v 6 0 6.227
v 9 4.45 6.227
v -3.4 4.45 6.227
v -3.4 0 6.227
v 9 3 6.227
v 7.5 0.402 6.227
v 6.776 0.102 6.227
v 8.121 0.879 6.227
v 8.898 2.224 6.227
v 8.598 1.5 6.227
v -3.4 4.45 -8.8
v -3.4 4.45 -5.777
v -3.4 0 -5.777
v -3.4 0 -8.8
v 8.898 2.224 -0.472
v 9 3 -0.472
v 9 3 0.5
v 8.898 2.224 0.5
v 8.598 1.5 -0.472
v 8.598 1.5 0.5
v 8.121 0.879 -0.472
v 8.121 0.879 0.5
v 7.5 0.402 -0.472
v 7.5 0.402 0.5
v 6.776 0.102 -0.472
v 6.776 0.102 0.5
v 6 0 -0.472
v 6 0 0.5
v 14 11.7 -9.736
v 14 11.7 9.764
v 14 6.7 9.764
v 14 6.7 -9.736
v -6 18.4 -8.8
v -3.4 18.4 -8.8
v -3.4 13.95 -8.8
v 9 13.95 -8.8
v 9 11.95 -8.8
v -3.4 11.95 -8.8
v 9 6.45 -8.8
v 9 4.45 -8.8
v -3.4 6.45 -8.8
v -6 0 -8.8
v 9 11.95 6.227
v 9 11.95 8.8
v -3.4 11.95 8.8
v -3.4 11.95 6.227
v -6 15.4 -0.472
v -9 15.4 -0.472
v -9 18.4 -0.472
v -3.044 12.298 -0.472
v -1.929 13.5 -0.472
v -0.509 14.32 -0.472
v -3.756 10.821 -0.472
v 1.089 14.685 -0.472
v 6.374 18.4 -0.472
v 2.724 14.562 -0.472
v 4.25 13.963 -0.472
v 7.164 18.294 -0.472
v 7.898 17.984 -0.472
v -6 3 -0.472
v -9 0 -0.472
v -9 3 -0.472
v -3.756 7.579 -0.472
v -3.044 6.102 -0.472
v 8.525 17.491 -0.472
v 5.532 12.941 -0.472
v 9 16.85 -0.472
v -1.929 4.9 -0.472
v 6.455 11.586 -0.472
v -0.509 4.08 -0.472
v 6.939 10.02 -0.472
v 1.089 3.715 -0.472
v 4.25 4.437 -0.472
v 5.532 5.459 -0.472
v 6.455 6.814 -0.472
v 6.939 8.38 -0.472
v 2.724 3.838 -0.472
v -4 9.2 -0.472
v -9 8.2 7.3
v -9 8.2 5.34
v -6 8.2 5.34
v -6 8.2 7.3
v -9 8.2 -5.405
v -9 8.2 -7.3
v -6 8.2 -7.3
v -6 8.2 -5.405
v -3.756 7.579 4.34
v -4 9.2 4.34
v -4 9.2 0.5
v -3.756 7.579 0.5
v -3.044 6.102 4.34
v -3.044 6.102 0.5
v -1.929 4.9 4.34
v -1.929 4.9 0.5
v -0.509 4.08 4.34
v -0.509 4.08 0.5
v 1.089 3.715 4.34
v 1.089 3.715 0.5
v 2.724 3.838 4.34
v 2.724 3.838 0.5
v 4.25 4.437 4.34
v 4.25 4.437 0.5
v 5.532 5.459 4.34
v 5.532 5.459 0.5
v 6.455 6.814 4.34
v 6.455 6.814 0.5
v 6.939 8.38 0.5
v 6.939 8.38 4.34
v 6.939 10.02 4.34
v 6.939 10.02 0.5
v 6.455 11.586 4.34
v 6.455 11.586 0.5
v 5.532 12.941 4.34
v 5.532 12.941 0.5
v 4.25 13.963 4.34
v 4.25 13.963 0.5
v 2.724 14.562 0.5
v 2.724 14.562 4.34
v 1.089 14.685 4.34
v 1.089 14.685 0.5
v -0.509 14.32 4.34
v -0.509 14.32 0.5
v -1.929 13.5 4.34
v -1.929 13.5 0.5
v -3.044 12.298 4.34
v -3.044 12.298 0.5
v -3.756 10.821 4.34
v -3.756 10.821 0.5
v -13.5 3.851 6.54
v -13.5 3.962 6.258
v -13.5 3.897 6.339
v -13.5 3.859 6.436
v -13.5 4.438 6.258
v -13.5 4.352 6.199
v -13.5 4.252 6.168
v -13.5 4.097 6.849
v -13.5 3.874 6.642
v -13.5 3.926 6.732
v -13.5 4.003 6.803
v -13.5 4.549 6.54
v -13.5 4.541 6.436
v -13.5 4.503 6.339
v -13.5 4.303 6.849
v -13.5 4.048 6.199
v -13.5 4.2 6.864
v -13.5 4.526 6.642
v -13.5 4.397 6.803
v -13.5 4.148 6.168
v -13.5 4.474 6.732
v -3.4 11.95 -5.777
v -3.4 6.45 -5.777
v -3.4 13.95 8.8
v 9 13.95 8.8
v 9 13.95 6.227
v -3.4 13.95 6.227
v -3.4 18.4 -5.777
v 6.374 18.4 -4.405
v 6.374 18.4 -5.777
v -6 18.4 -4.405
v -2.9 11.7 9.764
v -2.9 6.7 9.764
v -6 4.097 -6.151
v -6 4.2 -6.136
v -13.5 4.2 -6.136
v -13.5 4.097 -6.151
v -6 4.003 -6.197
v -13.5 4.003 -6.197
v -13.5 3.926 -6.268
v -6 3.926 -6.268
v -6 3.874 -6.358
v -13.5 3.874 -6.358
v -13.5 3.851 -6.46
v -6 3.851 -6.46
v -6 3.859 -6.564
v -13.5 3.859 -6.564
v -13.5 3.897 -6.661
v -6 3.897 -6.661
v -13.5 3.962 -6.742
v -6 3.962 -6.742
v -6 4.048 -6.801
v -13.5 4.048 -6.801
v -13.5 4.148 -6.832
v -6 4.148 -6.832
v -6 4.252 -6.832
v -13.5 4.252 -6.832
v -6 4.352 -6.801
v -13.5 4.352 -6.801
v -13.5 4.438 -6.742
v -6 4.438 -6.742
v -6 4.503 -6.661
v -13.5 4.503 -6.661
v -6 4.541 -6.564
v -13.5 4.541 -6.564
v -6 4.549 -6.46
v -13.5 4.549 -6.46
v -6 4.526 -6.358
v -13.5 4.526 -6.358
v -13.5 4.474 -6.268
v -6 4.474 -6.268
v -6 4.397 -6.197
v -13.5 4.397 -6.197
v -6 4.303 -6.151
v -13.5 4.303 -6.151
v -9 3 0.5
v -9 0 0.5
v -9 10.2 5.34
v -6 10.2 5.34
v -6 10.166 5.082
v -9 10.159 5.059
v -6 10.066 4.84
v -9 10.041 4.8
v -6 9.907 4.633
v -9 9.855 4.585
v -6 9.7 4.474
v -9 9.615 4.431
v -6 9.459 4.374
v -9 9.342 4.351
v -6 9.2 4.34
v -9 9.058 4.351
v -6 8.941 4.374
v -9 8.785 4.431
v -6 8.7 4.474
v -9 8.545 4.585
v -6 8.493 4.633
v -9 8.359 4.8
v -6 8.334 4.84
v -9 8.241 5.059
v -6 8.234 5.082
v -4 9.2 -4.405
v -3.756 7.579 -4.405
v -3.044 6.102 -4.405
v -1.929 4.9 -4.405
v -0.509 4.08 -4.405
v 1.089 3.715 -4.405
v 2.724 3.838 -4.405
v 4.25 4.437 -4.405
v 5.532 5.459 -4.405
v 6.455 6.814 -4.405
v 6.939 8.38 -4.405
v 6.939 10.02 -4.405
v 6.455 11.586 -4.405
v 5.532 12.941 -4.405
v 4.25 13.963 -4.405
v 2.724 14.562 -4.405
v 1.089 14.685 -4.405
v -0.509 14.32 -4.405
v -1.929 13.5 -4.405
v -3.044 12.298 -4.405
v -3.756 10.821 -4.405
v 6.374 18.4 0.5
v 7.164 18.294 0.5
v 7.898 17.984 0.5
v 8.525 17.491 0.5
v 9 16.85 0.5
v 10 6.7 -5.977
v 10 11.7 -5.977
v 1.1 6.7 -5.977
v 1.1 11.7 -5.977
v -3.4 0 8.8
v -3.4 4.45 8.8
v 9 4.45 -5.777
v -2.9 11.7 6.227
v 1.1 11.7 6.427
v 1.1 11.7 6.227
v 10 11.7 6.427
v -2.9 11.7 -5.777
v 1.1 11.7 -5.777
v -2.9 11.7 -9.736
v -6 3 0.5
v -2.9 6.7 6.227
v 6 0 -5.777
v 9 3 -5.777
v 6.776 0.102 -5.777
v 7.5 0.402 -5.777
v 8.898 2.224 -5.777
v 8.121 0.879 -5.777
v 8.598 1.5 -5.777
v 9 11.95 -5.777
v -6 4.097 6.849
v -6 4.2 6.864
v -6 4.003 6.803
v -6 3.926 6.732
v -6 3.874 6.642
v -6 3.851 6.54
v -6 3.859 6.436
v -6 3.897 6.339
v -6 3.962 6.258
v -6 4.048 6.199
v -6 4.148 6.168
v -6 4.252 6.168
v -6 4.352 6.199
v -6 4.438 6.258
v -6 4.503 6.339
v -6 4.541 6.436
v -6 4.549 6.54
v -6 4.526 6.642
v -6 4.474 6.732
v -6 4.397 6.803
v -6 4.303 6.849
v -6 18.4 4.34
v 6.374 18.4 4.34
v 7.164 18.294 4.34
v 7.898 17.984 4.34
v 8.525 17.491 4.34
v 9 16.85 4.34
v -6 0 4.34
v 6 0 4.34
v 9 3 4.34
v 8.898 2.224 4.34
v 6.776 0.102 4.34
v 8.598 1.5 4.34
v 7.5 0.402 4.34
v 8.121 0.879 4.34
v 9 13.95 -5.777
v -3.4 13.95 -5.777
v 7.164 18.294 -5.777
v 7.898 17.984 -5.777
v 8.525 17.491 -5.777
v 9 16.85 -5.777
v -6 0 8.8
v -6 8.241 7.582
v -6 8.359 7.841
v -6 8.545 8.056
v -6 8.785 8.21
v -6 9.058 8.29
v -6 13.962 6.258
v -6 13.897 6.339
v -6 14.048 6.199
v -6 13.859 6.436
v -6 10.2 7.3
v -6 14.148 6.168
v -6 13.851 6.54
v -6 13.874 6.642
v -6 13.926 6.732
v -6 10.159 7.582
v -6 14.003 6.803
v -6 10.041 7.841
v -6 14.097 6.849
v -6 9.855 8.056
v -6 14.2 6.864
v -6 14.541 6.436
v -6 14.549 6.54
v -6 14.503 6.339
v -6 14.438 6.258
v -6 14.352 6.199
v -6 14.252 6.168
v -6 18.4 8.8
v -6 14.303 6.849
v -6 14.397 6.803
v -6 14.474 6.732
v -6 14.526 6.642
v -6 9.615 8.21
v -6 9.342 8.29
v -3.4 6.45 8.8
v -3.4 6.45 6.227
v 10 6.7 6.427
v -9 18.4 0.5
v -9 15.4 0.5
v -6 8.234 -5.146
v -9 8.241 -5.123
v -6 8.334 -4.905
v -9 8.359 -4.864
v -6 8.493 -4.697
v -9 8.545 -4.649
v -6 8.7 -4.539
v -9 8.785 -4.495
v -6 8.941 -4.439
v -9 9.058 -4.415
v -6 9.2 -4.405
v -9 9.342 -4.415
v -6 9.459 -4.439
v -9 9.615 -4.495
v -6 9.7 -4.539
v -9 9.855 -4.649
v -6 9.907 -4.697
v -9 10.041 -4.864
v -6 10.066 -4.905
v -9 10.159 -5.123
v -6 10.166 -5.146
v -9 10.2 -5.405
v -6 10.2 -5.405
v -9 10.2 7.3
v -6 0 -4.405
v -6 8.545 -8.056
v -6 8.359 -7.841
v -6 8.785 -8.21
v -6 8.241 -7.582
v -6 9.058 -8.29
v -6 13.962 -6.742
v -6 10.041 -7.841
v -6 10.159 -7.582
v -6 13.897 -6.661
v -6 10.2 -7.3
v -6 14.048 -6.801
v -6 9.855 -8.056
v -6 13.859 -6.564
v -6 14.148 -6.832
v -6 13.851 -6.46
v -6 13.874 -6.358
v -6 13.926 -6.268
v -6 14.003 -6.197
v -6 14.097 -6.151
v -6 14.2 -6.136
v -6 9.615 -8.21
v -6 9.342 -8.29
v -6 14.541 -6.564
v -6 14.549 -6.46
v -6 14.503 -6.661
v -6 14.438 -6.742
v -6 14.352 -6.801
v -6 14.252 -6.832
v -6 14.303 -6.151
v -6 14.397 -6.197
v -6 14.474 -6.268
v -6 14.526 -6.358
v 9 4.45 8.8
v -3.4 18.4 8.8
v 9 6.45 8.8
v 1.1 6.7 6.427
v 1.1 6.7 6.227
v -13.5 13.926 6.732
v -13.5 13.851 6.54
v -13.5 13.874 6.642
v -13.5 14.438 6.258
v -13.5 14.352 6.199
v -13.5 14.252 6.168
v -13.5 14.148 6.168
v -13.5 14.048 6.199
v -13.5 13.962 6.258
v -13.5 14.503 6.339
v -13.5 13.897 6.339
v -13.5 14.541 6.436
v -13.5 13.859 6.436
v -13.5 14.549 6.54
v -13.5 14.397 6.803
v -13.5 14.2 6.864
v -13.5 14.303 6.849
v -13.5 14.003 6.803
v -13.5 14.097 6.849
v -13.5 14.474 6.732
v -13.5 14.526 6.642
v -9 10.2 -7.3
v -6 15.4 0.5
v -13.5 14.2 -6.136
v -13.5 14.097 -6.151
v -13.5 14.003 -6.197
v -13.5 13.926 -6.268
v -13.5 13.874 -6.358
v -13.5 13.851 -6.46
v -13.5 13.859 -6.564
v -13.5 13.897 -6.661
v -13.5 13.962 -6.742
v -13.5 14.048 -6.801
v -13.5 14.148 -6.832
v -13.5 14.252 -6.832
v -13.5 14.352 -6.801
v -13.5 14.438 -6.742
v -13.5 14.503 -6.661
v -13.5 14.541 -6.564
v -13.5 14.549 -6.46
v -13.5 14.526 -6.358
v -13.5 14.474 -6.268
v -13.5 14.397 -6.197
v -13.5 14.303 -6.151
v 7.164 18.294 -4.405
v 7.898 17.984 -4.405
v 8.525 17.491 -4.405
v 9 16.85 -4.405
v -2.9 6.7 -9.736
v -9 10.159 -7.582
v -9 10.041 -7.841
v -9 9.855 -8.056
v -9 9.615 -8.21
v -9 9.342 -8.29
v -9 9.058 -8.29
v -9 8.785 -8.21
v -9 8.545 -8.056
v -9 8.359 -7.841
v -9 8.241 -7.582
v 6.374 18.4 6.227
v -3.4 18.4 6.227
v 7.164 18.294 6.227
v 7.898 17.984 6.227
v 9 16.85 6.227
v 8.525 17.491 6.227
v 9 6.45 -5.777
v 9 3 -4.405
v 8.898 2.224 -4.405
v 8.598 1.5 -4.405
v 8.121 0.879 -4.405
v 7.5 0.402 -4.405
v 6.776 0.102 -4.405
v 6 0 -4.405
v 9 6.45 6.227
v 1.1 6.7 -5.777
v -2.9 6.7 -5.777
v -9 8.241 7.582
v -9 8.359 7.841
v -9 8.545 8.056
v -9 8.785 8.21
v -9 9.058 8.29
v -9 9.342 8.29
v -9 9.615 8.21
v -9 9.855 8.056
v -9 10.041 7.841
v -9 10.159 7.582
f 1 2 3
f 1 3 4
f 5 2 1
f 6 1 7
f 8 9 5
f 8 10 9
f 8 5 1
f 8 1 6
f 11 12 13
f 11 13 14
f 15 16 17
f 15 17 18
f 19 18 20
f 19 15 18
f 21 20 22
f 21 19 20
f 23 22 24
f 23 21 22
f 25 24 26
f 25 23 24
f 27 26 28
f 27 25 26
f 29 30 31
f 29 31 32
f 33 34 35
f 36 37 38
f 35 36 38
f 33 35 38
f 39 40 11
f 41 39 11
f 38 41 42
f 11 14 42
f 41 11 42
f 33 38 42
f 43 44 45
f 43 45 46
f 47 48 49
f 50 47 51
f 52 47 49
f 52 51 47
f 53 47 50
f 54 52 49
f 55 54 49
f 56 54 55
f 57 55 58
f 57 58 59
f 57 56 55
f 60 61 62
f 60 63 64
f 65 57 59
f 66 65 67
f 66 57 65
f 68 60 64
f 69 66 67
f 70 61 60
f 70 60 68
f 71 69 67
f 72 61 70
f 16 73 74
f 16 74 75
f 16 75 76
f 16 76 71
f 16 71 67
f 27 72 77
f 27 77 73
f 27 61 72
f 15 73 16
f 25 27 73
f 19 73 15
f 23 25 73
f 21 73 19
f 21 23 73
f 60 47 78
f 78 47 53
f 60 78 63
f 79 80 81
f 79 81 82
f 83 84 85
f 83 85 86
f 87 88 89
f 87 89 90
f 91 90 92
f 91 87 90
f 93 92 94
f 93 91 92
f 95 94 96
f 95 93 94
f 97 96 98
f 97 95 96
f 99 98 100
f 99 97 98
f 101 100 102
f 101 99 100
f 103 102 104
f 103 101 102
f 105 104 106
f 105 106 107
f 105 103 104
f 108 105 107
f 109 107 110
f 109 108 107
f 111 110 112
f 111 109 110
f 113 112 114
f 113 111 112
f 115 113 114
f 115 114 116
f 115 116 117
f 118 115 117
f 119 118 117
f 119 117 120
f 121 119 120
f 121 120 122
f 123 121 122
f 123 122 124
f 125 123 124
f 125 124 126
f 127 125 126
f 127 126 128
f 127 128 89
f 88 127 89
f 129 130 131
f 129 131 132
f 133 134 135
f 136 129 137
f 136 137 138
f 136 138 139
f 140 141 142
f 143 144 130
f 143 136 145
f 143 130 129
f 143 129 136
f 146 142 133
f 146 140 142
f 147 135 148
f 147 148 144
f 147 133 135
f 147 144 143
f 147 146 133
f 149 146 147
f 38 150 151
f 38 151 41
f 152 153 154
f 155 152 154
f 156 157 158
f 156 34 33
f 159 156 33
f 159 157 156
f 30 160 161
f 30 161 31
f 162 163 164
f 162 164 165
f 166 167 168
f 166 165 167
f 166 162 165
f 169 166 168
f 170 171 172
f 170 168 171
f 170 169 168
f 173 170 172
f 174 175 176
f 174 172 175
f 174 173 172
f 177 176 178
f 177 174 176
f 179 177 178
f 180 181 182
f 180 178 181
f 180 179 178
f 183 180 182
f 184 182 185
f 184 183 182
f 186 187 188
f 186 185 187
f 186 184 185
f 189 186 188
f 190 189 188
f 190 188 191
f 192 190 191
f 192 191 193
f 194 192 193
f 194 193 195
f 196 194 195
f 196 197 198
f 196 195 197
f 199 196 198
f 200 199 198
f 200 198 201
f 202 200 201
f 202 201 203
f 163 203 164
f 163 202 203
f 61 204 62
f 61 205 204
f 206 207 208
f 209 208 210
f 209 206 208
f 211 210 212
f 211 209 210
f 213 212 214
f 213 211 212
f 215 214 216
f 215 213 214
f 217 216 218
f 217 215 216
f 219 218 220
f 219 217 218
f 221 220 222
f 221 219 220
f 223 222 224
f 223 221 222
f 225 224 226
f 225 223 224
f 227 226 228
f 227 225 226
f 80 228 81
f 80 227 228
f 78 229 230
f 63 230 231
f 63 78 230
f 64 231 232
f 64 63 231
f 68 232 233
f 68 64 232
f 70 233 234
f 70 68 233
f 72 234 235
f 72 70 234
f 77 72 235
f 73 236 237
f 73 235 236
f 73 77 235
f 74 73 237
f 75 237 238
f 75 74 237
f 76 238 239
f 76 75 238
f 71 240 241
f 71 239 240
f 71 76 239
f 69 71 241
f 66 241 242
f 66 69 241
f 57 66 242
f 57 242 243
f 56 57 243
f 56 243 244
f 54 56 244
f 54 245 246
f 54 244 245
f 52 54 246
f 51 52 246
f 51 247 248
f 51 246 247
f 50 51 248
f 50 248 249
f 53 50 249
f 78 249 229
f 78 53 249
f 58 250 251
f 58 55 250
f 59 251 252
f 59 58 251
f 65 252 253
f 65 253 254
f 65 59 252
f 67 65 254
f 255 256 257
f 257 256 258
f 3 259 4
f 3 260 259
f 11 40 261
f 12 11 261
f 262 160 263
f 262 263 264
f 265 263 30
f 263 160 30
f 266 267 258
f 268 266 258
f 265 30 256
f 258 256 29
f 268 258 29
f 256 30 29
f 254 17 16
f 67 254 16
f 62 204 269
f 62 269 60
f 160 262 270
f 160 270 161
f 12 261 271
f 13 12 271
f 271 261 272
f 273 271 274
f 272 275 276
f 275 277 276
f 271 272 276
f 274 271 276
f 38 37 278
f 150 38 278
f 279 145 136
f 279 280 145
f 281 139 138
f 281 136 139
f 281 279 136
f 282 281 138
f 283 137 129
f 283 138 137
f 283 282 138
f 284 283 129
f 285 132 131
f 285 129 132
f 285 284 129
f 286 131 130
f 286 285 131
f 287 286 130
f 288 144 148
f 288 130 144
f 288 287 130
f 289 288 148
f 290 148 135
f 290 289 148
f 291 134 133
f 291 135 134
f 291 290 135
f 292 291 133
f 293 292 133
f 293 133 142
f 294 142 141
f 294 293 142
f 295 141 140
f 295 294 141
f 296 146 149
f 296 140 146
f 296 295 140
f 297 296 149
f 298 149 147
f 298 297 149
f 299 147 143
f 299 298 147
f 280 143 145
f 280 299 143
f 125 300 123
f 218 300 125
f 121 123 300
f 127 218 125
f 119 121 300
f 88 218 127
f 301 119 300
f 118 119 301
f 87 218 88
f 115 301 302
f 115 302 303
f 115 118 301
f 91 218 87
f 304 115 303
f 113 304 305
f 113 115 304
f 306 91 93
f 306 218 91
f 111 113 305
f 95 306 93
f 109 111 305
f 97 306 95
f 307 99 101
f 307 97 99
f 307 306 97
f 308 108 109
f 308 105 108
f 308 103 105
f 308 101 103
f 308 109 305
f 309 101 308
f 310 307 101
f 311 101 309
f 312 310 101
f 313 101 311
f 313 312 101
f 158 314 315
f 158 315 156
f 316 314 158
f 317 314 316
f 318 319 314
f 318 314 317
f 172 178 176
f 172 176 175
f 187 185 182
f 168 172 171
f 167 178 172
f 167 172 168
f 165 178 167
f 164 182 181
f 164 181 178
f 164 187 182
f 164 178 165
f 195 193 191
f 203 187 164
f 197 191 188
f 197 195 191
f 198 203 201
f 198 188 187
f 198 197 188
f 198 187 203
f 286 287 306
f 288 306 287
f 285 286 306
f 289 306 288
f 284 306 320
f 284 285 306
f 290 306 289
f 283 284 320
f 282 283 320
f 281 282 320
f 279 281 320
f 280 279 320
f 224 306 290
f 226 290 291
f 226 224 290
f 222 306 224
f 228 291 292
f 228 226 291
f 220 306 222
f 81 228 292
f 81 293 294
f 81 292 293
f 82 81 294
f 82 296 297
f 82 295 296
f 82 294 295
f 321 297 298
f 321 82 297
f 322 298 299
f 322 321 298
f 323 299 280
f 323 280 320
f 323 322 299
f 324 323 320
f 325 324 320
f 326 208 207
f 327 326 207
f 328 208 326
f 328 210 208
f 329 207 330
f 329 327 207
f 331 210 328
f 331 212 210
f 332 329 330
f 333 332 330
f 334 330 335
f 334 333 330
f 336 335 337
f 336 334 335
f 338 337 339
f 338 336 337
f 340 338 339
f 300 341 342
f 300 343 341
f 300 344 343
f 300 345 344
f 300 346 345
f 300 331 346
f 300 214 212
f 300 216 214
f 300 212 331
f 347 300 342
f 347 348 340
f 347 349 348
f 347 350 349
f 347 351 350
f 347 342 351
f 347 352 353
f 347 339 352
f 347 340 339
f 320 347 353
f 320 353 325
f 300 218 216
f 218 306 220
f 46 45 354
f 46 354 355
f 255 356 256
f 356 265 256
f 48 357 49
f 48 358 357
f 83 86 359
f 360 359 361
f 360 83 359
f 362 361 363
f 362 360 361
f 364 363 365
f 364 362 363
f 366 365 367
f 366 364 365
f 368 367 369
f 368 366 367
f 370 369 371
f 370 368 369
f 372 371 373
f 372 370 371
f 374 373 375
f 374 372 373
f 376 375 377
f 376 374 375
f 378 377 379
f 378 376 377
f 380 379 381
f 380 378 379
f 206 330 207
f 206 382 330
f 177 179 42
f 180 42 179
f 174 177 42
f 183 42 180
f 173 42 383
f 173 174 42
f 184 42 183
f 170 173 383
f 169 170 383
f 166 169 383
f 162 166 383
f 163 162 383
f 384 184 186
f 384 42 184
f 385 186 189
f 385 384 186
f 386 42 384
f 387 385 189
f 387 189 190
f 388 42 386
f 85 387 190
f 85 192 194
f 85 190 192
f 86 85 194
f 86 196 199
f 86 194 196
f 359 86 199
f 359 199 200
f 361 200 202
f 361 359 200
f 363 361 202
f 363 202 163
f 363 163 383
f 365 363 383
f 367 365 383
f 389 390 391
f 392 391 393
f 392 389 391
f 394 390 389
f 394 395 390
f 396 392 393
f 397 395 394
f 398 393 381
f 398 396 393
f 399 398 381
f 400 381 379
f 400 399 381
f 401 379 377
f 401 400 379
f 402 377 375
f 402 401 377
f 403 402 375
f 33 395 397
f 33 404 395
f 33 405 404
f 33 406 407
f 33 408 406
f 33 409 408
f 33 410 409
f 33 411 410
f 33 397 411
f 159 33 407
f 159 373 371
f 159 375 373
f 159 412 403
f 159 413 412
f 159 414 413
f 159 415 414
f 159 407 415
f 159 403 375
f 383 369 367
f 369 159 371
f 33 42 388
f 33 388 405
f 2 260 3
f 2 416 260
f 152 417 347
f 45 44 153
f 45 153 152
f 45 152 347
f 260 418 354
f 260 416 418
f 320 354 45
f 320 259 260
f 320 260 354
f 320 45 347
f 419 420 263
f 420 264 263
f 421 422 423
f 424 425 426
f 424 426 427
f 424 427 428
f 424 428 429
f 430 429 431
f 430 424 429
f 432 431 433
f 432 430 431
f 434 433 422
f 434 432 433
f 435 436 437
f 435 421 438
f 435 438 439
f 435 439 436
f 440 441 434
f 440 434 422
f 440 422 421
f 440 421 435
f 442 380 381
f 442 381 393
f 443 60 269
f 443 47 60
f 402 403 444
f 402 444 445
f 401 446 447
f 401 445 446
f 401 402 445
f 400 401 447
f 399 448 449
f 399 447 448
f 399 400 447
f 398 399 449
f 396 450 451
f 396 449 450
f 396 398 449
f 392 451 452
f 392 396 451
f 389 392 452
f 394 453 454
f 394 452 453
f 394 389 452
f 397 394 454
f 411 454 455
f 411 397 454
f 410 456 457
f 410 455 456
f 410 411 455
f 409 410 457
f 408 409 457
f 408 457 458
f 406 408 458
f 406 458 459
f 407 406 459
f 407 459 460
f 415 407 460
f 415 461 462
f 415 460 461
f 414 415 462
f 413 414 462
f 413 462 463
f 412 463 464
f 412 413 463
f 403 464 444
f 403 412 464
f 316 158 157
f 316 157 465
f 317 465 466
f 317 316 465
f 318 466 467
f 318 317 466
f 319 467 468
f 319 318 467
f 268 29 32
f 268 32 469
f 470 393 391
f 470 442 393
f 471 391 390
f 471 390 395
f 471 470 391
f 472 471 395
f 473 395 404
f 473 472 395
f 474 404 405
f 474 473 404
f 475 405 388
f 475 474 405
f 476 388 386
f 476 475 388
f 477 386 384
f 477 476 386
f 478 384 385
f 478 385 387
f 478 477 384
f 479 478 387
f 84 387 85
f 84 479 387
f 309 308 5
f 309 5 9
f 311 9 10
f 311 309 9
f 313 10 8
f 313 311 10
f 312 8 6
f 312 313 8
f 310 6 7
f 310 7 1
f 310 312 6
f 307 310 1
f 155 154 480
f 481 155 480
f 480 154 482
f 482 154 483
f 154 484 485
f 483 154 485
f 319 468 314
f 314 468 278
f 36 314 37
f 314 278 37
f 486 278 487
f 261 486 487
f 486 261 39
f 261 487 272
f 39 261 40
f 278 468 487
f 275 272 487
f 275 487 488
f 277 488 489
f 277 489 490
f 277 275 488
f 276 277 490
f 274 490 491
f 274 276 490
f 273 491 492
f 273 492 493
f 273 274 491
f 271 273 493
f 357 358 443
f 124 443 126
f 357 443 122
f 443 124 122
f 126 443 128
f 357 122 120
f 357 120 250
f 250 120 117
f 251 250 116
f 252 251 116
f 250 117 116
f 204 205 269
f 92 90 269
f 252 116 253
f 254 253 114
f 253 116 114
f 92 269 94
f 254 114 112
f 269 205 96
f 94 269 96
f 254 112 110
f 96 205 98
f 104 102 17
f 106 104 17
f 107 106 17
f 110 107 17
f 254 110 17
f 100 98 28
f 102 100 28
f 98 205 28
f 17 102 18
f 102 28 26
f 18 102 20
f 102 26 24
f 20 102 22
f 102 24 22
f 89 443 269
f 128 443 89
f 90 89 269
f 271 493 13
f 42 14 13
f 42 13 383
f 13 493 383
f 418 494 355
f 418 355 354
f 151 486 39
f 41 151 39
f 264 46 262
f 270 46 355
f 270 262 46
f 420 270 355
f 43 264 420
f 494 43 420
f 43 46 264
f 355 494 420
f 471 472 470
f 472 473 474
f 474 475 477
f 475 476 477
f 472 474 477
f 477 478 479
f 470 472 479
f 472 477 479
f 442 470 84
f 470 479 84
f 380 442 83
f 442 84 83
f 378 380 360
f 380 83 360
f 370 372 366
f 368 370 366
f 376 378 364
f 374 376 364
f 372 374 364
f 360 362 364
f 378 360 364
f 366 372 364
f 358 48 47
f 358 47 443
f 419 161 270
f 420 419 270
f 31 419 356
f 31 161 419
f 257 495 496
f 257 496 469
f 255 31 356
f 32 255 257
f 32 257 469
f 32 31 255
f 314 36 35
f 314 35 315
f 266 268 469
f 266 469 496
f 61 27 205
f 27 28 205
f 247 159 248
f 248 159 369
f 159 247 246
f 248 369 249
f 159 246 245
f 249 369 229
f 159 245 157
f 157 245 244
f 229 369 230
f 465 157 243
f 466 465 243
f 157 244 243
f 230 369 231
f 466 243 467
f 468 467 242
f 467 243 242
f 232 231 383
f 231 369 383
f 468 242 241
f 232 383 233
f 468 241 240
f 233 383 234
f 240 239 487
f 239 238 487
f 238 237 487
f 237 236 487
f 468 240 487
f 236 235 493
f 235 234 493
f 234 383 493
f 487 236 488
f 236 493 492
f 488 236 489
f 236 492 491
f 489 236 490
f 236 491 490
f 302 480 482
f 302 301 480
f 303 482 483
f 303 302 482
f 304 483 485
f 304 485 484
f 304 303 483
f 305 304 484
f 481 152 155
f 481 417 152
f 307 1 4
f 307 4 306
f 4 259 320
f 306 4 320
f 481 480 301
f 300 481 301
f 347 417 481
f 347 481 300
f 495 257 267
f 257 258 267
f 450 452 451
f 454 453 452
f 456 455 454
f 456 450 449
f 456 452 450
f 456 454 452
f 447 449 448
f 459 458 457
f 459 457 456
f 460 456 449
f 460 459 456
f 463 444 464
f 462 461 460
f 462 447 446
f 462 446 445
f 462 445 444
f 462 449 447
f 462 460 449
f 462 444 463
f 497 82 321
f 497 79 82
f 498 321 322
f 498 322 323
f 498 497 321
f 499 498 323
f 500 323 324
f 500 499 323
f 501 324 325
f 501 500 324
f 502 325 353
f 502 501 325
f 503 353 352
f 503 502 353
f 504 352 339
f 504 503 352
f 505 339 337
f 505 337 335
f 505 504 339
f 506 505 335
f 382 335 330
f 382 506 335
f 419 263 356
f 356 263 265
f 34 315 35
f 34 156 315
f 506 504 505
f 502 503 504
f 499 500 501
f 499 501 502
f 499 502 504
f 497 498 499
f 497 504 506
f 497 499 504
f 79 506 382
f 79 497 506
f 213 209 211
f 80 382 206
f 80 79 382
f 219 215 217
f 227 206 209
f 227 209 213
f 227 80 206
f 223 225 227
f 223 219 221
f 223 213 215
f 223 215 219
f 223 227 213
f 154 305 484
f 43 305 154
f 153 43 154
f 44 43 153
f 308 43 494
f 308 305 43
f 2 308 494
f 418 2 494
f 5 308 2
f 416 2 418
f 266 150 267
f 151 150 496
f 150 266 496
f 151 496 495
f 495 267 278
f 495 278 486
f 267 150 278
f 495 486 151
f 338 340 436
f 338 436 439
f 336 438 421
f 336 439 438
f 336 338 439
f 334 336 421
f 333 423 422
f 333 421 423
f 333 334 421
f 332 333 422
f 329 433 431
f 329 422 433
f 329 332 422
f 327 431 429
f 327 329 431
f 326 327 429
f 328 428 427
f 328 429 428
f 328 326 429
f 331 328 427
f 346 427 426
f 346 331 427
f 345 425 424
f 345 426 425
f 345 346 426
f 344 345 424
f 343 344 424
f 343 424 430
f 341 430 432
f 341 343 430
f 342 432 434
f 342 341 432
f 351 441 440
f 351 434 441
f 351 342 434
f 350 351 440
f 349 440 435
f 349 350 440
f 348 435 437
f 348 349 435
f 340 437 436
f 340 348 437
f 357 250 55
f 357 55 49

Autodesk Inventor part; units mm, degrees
ref_plane "YZ Plane" through (0, 0, 0) normal (1, 0, 0) x (0, 1, 0)
ref_plane "XZ Plane" through (0, 0, 0) normal (0, 1, 0) x (-1, 0, 0)
ref_plane "XY Plane" through (0, 0, 0) normal (0, 0, 1) x (1, 0, 0)
sketch "Эскиз1" plane through (0, 0, 0) normal (0, 1, 0) x (-1, 0, 0)
  line L0 (9, 8.8) -> (9, -8.8) construction
  line L1 (-9, -8.8) -> (-9, 8.8) construction
  line L2 (-9, 8.8) -> (9, -8.8) construction
  line L3 (9, 8.8) -> (-9, -8.8) construction
  line L4 (9, 0) -> (9, 0.5)
  line L5 (9, 0.5) -> (-9, 0.5)
  line L6 (9, 0) -> (9, -0.4719)
  line L7 (9, -0.4719) -> (-9, -0.4719)
  line L8 (-9, 0.5) -> (-9, -0.4719)
  line L9 (9, 0) -> (9, 4.3404) construction
  line L10 (9, 0) -> (9, -4.4046) construction
  line L11 (9, 4.3404) -> (-9, 4.3404)
  line L12 (-9, 4.3404) -> (-9, 8.8)
  line L13 (-9, 8.8) -> (9, 8.8)
  line L14 (9, 8.8) -> (9, 4.3404)
  line L15 (9, -4.4046) -> (-9, -4.4046)
  line L16 (-9, -4.4046) -> (-9, -8.8)
  line L17 (-9, -8.8) -> (9, -8.8)
  line L18 (9, -8.8) -> (9, -4.4046)
  point P0 (0, 0)
  dimension "d0" = 18
  dimension "d1" = 17.6
  dimension "d2" = 0.5
extrude "Выдавливание1" add sketch "Эскиз1" along normal blind 18.4
sketch "Эскиз4" plane through (9, 0, 8.8) normal (1, 0, 0) x (0, 0, -1)
  line L0 (13.2046, 0) -> (17.6, 0) projected
  line L1 (14.5773, 0) -> (21.0298, 0)
  line L2 (21.0298, 0) -> (21.0298, 4.45)
  line L3 (21.0298, 4.45) -> (14.5773, 4.45)
  line L4 (14.5773, 4.45) -> (14.5773, 0)
  line L5 (14.5773, 18.4) -> (21.6, 18.4)
  line L6 (21.6, 18.4) -> (21.6, 13.95)
  line L7 (21.6, 13.95) -> (14.5773, 13.95)
  line L8 (14.5773, 13.95) -> (14.5773, 18.4)
  line L9 (4.4596, 18.4) -> (0, 18.4) projected
  line L10 (2.5726, 18.4) -> (-5.1704, 18.4)
  line L11 (-5.1704, 18.4) -> (-5.1704, 13.95)
  line L12 (-5.1704, 13.95) -> (2.5726, 13.95)
  line L13 (2.5726, 13.95) -> (2.5726, 18.4)
  line L14 (4.4596, 0) -> (0, 0) projected
  line L15 (2.5726, 0) -> (-6.491, 0)
  line L16 (-6.491, 0) -> (-6.491, 4.45)
  line L17 (-6.491, 4.45) -> (2.5726, 4.45)
  line L18 (2.5726, 4.45) -> (2.5726, 0)
  line L19 (20.6227, 11.95) -> (14.5773, 11.95)
  line L20 (14.5773, 11.95) -> (14.5773, 6.45)
  line L21 (14.5773, 6.45) -> (20.6227, 6.45)
  line L22 (20.6227, 6.45) -> (20.6227, 11.95)
  line L23 (17.6, 0) -> (17.6, 18.4) projected
  line L24 (20.6227, 11.95) -> (14.5773, 6.45) construction
  line L25 (14.5773, 11.95) -> (20.6227, 6.45) construction
  line L26 (-2.5726, 11.95) -> (2.5726, 11.95)
  line L27 (2.5726, 11.95) -> (2.5726, 6.45)
  line L28 (2.5726, 6.45) -> (-2.5726, 6.45)
  line L29 (-2.5726, 6.45) -> (-2.5726, 11.95)
  line L30 (0, 0) -> (0, 18.4) projected
  line L31 (-2.5726, 11.95) -> (2.5726, 6.45) construction
  line L32 (2.5726, 11.95) -> (-2.5726, 6.45) construction
  point P0 (8.8, 0)
  point P1 (17.6, 9.2)
  point P2 (0, 9.2)
  dimension "d12" = 5.5
  dimension "d41" = 2
  dimension "d42" = 2
  dimension "d43" = 2
extrude "Выдавливание2" cut sketch "Эскиз4" against normal blind 12.4
sketch "Эскиз6" plane through (9, 0, 4.3404) normal (0, 0, -1) x (-1, 0, 0)
  line L0 (9, 0) -> (9, 18.4) construction
  line L1 (18, 18.4) -> (0, 18.4) projected
  line L2 (9, 9.2) -> (7.5, 9.2) construction
  circle A0 centre (7.5, 9.2) radius 5.5
  dimension "d16" = 1.5
  dimension "d53" = 11
sketch "Эскиз7" plane through (-9, 0, -8.8) normal (0, 0, -1) x (-1, 0, 0)
  line L0 (-18, 13.95) -> (-5.6, 13.95) projected
  line L1 (-18, 0) -> (-18, 18.4) construction
  line L2 (-21, -3) -> (-15, -3) construction
  line L3 (-15, -3) -> (-15, 3) construction
  line L4 (-15, 3) -> (-21, 3) construction
  line L5 (-21, 3) -> (-21, -3) construction
  line L6 (-21, -3) -> (-15, 3) construction
  line L7 (-15, -3) -> (-21, 3) construction
  line L8 (-21.3737, 21.4) -> (-15.3737, 21.4) construction
  line L9 (-15.3737, 21.4) -> (-15.3737, 15.4) construction
  line L10 (-15.3737, 15.4) -> (-21.3737, 15.4) construction
  line L11 (-21.3737, 15.4) -> (-21.3737, 21.4) construction
  line L12 (-21.3737, 21.4) -> (-15.3737, 15.4) construction
  line L13 (-15.3737, 21.4) -> (-21.3737, 15.4) construction
  arc A0 (-18, 3) -> (-15, 0) centre (-15, 3) ccw
  arc A1 (-15.3737, 18.4) -> (-18, 13.95) centre (-15.3737, 15.4) ccw
  line L14 (-18, 3) -> (-18, 0)
  line L15 (-15, 0) -> (-18, 0)
  line L16 (-15.3737, 18.4) -> (-18, 18.4)
  line L17 (-18, 13.95) -> (-18, 18.4)
  point P0 (-9, 0)
  dimension "d21" = 6
  dimension "d22" = 6
extrude "Выдавливание3" add sketch "Эскиз6" along normal up to surface (8.745 mm away)
extrude "Выдавливание4" cut sketch "Эскиз7" against normal blind 23
ref_plane "РабПлоскость1" through (-3.4, 9.2, 8.8) normal (0, -1, 0) x (0, 0, -1)
sketch "Эскиз9" plane through (-3.4, 9.2, 8.8) normal (0, -1, 0) x (0, 0, -1)
  line L0 (-0.964, 17.4) -> (18.536, 17.4)
  line L1 (18.536, 17.4) -> (18.536, 0.5)
  line L2 (18.536, 0.5) -> (-0.964, 0.5)
  line L3 (-0.964, 0.5) -> (-0.964, 17.4)
  line L4 (2.3726, 13.4) -> (14.7773, 13.4)
  line L5 (14.7773, 13.4) -> (14.7773, 4.5)
  line L6 (14.7773, 4.5) -> (2.3726, 4.5)
  line L7 (2.3726, 4.5) -> (2.3726, 13.4)
  line L8 (8.786, 13.2041) -> (8.786, 18.9436) construction
  line L9 (0, 0) -> (0, 12.4) projected
  line L10 (17.6, -5.6) -> (13.2046, -5.6) projected
  point P0 (8.8, 3.4)
  point P1 (17.6, 0)
  point P2 (2.5726, 12.4)
  point P3 (14.5773, 12.4)
  dimension "d30" = 8.786
  dimension "d31" = 9.75
  dimension "d32" = 9.75
  dimension "d33" = 23
  dimension "d34" = 0.5
  dimension "d35" = 0.2
  dimension "d36" = 0.2
  dimension "d37" = 4
  dimension "d38" = 4
extrude "Выдавливание5" add sketch "Эскиз9" along normal mid plane 5
sketch "Эскиз10" plane through (-9, 0, 4.3404) normal (-1, 0, 0) x (0, 0, 1)
  line L0 (4.4596, 6.45) -> (4.4596, 11.95) projected
  line L1 (4.4596, 9.2) -> (-13.9375, 9.2) construction
  line L2 (-14.0763, 6.7) -> (-14.0763, 11.7) projected
  line L3 (1, 9.2) -> (2.9596, 9.2) construction
  line L4 (1, 8.2) -> (2.9596, 8.2)
  line L5 (2.9596, 10.2) -> (1, 10.2)
  arc A0 (1, 10.2) -> (1, 8.2) centre (1, 9.2) ccw
  arc A1 (2.9596, 8.2) -> (2.9596, 10.2) centre (2.9596, 9.2) ccw
  line L6 (0, 0) -> (0, 18.4) projected
  line L7 (4.4596, 0) -> (4.4596, 18.4) projected
  line L8 (-9.745, 9.2) -> (-11.6404, 9.2) construction
  line L9 (-9.745, 10.2) -> (-11.6404, 10.2)
  line L10 (-11.6404, 8.2) -> (-9.745, 8.2)
  arc A2 (-9.745, 8.2) -> (-9.745, 10.2) centre (-9.745, 9.2) ccw
  arc A3 (-11.6404, 10.2) -> (-11.6404, 8.2) centre (-11.6404, 9.2) ccw
  line L11 (-8.745, 0) -> (-8.745, 18.4) projected
  line L12 (-13.1404, 0) -> (-13.1404, 18.4) projected
  line L13 (-4.8123, 0) -> (-4.8123, 18.4) projected
  line L14 (-3.8404, 0) -> (-3.8404, 3) projected
  line L15 (-4.8123, 0) -> (-3.8404, 0)
  line L16 (-3.8404, 0) -> (-3.8404, 3)
  line L17 (-3.8404, 3) -> (-4.8123, 3)
  line L18 (-4.8123, 3) -> (-4.8123, 0)
  line L19 (-4.8123, 3) -> (-4.8123, 16.85) projected
  line L20 (-3.8404, 18.4) -> (-4.8123, 18.4)
  line L21 (-4.8123, 18.4) -> (-4.8123, 15.4)
  line L22 (-4.8123, 15.4) -> (-3.8404, 15.4)
  line L23 (-3.8404, 15.4) -> (-3.8404, 18.4)
  line L24 (8.1135, -3.7823) -> (-17.89, -3.7823)
  line L25 (-17.89, -3.7823) -> (-17.89, 22.1054)
  line L26 (-17.89, 22.1054) -> (8.1135, 22.1054)
  line L27 (8.1135, 22.1054) -> (8.1135, -3.7823)
  point P0 (-4.3404, 0)
  point P1 (1.9798, 9.2)
  point P2 (-10.6927, 9.2)
  point P3 (-4.8123, 3)
  dimension "d44" = 2
  dimension "d45" = 1
  dimension "d46" = 1.5
  dimension "d47" = 1
  dimension "d48" = 1.5
  dimension "d49" = 3
  dimension "d50" = 3
extrude "Выдавливание6" cut sketch "Эскиз10" against normal blind 3
sketch "Эскиз11" plane through (-6, 0, 4.3404) normal (-1, 0, 0) x (0, 0, 1)
  line L0 (-4.3263, -2.8057) -> (-4.3263, 20.2349) construction
  line L1 (5.7896, 9.2) -> (-19.3839, 9.2) construction
  line L2 (2.1737, 14.2) -> (-10.8263, 14.2) construction
  line L3 (-10.8263, 14.2) -> (-10.8263, 4.2) construction
  line L4 (-10.8263, 4.2) -> (2.1737, 4.2) construction
  line L5 (2.1737, 4.2) -> (2.1737, 14.2) construction
  line L6 (2.1737, 14.2) -> (-10.8263, 4.2) construction
  line L7 (-10.8263, 14.2) -> (2.1737, 4.2) construction
  circle A0 centre (2.1737, 4.2) radius 0.35
  circle A1 centre (-10.8263, 4.2) radius 0.35
  circle A2 centre (-10.8263, 14.2) radius 0.35
  circle A3 centre (2.1737, 14.2) radius 0.35
  point P0 (-4.3404, 0)
  point P1 (-4.3263, 9.2)
  dimension "d54" = 13
  dimension "d55" = 10
  dimension "d56" = 0.7
  dimension "d57" = 0.7
  dimension "d58" = 0.7
  dimension "d59" = 0.7
extrude "Выдавливание7" add sketch "Эскиз11" along normal blind 7.5
properties part number "UU10.5"
